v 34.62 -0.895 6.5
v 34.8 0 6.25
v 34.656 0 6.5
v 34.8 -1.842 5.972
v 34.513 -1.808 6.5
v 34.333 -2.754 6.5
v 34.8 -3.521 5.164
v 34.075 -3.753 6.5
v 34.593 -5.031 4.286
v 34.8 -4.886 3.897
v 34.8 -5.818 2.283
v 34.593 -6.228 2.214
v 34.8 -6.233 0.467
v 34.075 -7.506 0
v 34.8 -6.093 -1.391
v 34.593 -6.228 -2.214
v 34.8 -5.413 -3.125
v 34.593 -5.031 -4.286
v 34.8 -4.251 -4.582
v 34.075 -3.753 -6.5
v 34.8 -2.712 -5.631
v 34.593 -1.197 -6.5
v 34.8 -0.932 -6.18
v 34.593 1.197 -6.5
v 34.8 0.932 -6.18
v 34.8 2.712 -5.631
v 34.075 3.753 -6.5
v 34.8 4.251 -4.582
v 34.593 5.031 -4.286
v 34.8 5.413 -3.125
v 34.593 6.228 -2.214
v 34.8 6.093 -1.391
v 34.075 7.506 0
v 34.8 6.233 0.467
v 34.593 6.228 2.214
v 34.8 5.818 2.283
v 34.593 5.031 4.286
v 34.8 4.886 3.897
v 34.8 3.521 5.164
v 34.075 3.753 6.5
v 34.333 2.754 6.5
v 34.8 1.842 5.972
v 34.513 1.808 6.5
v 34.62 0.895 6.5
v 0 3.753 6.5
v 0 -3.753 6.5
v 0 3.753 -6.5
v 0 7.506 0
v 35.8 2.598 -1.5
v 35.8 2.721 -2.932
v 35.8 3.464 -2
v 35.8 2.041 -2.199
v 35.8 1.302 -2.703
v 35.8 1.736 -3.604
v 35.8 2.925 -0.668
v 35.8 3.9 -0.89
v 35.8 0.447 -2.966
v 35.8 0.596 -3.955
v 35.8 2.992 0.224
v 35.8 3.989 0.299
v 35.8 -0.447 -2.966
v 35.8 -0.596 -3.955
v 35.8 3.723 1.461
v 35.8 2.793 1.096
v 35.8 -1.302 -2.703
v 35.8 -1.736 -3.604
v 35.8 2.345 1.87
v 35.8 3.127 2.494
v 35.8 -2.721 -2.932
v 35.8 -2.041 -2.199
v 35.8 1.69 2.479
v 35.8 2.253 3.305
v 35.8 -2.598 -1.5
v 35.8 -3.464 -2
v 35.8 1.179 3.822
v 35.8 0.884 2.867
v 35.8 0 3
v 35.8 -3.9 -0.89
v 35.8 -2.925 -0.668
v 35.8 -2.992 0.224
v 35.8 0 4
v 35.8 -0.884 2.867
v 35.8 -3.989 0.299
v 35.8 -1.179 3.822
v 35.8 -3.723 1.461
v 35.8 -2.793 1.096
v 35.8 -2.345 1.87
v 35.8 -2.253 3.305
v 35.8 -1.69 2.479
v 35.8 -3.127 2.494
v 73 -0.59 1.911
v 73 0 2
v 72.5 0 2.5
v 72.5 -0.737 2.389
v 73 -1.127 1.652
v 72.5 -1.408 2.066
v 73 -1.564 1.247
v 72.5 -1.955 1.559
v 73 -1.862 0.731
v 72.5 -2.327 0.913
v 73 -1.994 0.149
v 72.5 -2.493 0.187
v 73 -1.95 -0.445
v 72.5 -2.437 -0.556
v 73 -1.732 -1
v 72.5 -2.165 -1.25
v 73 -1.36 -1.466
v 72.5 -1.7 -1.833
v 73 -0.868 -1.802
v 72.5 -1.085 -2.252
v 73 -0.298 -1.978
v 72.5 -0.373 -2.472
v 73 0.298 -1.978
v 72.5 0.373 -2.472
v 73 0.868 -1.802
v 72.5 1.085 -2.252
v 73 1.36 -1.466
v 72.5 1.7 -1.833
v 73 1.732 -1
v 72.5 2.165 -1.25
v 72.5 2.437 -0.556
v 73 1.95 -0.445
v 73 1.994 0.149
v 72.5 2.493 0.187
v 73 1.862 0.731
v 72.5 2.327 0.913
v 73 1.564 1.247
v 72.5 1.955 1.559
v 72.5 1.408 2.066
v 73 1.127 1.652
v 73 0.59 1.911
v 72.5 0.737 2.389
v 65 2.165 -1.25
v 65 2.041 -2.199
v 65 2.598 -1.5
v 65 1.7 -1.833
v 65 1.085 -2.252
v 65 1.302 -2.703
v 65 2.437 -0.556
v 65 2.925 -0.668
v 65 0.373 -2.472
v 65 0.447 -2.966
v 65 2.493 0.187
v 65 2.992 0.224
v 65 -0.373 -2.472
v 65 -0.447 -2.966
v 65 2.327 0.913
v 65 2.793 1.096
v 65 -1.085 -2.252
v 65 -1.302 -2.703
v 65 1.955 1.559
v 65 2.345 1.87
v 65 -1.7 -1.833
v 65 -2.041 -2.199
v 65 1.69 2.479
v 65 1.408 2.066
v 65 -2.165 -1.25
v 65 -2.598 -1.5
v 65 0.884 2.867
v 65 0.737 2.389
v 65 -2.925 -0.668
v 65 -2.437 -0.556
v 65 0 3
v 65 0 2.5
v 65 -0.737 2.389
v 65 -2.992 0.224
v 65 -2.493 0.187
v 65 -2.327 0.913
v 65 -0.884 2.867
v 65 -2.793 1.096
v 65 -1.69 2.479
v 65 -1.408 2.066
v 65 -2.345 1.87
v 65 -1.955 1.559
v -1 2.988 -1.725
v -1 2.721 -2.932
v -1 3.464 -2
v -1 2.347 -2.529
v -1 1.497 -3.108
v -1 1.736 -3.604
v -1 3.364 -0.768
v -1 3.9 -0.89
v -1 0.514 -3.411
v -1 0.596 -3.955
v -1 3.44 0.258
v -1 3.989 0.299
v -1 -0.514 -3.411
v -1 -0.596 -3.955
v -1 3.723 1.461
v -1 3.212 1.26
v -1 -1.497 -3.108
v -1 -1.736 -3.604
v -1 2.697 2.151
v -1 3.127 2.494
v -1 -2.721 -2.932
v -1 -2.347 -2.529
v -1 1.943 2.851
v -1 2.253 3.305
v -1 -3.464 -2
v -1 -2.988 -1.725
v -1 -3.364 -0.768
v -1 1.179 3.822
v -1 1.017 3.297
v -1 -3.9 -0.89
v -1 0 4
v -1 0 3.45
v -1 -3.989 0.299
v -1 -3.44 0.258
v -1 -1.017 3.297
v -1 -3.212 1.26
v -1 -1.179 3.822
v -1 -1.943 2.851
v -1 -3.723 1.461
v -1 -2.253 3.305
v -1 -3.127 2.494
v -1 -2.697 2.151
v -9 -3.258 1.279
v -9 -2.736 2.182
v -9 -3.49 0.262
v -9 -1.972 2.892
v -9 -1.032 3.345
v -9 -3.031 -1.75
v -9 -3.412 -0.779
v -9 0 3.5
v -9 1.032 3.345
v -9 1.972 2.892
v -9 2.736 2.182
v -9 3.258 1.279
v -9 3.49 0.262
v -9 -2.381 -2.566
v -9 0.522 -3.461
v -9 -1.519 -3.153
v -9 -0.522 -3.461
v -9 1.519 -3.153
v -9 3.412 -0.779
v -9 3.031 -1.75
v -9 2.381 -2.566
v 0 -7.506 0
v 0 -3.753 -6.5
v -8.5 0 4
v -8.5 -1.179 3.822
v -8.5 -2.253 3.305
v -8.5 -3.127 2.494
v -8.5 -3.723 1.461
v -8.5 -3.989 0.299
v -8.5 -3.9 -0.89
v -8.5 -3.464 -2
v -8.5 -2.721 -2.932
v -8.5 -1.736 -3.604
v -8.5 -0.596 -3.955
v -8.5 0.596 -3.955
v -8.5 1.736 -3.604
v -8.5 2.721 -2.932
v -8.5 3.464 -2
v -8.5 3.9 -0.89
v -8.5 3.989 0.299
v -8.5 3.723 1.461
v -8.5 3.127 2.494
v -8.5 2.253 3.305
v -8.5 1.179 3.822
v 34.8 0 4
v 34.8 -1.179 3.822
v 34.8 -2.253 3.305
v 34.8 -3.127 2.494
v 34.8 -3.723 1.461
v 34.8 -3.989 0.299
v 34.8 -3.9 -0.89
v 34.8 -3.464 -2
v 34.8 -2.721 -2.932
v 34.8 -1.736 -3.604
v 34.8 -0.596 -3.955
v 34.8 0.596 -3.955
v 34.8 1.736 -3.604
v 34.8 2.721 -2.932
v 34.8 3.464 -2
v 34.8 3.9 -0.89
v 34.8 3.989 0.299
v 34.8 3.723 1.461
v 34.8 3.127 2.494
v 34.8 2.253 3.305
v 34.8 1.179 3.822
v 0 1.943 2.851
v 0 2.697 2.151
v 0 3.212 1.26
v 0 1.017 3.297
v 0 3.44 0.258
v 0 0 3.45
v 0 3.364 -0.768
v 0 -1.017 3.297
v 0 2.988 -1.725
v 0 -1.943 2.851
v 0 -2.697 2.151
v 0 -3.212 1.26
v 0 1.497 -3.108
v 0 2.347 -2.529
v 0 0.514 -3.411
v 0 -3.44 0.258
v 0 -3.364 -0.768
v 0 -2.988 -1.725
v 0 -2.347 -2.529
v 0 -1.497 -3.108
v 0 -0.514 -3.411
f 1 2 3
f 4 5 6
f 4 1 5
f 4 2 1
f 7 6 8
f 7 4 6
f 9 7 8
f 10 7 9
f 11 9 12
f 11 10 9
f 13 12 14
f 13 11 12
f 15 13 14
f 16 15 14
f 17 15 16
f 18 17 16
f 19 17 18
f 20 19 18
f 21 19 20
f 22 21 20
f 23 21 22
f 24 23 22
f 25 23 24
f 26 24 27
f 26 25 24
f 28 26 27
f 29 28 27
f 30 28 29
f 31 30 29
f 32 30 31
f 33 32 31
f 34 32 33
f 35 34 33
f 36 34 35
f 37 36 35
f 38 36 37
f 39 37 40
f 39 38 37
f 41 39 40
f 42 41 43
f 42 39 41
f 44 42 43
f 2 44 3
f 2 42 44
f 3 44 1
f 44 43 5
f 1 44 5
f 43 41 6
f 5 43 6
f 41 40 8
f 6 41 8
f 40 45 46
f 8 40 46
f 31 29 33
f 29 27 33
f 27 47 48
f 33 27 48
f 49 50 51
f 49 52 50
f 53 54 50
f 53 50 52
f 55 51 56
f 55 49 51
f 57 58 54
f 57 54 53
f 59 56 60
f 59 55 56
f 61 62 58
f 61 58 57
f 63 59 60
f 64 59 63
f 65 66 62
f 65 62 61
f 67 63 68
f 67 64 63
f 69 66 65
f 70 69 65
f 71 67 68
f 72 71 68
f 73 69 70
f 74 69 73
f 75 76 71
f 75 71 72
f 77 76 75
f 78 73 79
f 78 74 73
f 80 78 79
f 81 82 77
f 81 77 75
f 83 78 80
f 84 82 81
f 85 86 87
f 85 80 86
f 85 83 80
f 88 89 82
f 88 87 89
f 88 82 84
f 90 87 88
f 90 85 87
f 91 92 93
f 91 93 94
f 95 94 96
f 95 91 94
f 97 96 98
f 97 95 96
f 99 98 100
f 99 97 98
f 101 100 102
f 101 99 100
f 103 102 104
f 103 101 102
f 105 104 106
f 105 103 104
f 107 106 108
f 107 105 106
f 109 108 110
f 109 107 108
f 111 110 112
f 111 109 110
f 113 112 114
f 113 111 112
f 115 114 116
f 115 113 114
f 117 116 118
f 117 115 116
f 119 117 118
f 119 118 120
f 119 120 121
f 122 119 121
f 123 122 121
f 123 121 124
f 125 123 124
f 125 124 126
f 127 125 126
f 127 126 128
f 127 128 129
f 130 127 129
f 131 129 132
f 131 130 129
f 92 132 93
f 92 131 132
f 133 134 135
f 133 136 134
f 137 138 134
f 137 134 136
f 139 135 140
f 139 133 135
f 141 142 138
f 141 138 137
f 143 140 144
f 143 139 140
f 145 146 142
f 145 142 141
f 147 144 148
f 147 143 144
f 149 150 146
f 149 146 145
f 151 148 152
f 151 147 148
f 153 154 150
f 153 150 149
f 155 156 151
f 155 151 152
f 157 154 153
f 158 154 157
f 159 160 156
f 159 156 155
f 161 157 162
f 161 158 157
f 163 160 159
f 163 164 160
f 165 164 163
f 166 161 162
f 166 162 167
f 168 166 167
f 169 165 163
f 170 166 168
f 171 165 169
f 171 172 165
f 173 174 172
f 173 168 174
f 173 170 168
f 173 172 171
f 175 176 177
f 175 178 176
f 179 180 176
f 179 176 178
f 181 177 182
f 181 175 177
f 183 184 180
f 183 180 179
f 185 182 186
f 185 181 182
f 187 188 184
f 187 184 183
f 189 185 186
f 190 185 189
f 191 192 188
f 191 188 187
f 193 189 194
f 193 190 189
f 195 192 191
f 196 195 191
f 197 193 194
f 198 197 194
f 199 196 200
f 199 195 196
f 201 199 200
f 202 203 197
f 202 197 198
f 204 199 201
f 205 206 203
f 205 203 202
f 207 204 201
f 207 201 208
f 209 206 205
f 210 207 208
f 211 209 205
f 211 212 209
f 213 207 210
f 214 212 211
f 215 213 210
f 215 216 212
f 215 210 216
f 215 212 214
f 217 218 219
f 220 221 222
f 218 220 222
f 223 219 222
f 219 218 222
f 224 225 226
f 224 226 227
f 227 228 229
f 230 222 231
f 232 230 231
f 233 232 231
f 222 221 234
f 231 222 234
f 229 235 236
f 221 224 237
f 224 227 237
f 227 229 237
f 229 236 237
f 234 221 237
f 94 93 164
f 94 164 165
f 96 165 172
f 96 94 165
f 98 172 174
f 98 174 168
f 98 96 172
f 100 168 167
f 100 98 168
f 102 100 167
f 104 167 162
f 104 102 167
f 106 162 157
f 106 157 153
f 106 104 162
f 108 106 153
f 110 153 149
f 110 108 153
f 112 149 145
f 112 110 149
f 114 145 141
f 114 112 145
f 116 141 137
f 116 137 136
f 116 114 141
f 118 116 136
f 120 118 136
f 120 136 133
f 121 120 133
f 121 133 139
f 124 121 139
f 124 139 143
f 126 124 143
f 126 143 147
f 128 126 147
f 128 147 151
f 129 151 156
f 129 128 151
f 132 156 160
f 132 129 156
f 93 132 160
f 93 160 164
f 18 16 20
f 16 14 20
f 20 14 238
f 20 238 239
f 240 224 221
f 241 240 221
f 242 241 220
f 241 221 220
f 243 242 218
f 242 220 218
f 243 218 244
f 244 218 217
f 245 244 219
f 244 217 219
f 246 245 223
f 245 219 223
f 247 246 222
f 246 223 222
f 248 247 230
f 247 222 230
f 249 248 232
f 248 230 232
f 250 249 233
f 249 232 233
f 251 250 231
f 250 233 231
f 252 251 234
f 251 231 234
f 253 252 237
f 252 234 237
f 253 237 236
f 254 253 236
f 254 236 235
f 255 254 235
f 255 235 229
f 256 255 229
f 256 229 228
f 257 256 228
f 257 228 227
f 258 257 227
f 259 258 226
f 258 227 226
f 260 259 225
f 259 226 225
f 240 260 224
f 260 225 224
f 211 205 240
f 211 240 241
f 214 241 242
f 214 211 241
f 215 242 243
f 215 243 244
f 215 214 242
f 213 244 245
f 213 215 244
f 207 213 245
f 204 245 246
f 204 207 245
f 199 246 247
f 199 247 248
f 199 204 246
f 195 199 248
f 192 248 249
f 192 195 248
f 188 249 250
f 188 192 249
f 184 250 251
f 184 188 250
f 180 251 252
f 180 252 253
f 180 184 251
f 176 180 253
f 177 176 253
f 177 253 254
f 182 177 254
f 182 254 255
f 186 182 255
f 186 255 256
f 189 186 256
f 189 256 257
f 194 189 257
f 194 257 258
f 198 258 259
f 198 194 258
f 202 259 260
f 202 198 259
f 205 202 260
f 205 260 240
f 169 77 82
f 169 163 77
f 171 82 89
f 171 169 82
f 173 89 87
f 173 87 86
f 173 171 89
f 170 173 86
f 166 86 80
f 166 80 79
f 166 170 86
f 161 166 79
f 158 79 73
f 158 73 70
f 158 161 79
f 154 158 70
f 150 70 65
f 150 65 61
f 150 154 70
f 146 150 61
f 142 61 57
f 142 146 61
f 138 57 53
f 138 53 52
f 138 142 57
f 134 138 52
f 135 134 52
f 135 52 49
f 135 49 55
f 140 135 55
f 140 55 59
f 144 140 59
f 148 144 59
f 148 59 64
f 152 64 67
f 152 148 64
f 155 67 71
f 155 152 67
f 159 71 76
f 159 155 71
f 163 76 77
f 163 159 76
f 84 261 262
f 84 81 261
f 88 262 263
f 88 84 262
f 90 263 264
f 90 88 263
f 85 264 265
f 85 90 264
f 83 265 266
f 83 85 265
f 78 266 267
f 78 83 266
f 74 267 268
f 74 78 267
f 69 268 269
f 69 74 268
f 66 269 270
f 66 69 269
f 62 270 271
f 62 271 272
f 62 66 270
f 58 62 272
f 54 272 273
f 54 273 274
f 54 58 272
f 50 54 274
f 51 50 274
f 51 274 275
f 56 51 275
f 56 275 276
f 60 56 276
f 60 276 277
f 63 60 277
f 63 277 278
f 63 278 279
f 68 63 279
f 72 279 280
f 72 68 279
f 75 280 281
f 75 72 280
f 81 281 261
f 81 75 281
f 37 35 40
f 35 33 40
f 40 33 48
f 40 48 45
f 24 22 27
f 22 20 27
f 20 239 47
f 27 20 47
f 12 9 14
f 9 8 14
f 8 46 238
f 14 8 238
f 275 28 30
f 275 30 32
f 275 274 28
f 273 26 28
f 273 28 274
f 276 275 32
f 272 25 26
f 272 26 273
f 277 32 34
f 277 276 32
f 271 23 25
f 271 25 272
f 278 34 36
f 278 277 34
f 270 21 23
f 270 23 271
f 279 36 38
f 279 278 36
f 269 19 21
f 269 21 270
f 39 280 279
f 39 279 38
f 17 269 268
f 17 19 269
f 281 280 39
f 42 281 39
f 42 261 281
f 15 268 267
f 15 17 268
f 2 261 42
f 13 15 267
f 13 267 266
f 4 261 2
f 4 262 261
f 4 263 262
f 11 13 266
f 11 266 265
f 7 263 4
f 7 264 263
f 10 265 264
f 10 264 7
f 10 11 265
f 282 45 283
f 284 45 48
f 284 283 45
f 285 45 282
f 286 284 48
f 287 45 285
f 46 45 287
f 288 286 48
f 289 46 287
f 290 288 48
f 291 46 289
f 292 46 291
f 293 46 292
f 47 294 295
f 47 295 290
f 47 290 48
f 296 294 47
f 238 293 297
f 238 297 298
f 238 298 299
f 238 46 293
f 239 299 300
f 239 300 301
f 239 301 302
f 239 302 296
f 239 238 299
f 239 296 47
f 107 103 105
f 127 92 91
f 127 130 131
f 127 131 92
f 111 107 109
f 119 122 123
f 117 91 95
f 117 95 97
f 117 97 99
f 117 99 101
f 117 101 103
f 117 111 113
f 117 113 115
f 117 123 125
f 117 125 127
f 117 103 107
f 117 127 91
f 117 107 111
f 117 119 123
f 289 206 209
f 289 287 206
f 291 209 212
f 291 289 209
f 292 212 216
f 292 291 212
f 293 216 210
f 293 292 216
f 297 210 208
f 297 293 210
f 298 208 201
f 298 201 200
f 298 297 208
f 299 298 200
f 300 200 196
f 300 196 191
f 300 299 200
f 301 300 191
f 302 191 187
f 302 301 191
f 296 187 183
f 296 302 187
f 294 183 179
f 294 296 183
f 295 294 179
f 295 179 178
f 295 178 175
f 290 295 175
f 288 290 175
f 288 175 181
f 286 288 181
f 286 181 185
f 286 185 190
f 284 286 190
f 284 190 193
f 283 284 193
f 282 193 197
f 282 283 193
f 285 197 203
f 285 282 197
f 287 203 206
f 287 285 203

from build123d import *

# Parameters (mm, degrees)
BOSS_EXTRUDE1_START = -9
BOSS_EXTRUDE1_DEPTH = 82
CHAMFER1_SIZE       = 0.5


with BuildPart() as part:
    # Sketch1 → Boss-Extrude1 (new body)
    with BuildSketch(Plane(origin=(0, 0, 0), x_dir=(0, 0, -1), z_dir=(1, 0, 0)).offset(BOSS_EXTRUDE1_START)):
        Polygon((0, 7.505553499), (-6.5, 3.75277675), (-6.5, -3.75277675), (0, -7.505553499), (6.5, -3.75277675), (6.5, 3.75277675), align=None)
    extrude(amount=BOSS_EXTRUDE1_DEPTH)

    # Sketch2 → Cut-Revolve1 (revolve, cut)
    with BuildSketch(Plane.XY, mode=Mode.PRIVATE) as cut_revolve1_sk:
        Polygon((0, 7.505553499), (-9, 7.505553499), (-9, 4), (-1, 4), (-1, 3.45), (0, 3.45), align=None)
    revolve(cut_revolve1_sk.sketch.rotate(Axis((-20.13204944, 0, 0), (1, 0, 0)), 90), axis=Axis((-20.13204944, 0, 0), (1, 0, 0)), mode=Mode.SUBTRACT)

    # Sketch3 → Cut-Revolve2 (revolve, cut)
    with BuildSketch(Plane.XY, mode=Mode.PRIVATE) as cut_revolve2_sk:
        Polygon((34.8, 7.505553499), (34.8, 4), (35.8, 4), (35.8, 3), (65, 3), (65, 2.5), (73, 2.5), (73, 7.505553499), align=None)
    revolve(cut_revolve2_sk.sketch.rotate(Axis((-14.24617289, 0, 0), (1, 0, 0)), 90), axis=Axis((-14.24617289, 0, 0), (1, 0, 0)), mode=Mode.SUBTRACT)

    # Sketch4 → Cut-Revolve3 (revolve, cut)
    with BuildSketch(Plane.XY, mode=Mode.PRIVATE) as cut_revolve3_sk:
        Polygon((34.8, 7.505553499), (34.075105849, 7.505553499), (34.8, 6.25), align=None)
    revolve(cut_revolve3_sk.sketch.rotate(Axis((-12.936203068, 0, 0), (1, 0, 0)), 90), axis=Axis((-12.936203068, 0, 0), (1, 0, 0)), mode=Mode.SUBTRACT)

    # Chamfer1
    chamfer1_edges = [part.edges().sort_by_distance(p)[0] for p in [
        (-9, 0, -4),
        (73, 0, -2.5),
    ]]
    chamfer(chamfer1_edges, length=CHAMFER1_SIZE)


solid = part.part
